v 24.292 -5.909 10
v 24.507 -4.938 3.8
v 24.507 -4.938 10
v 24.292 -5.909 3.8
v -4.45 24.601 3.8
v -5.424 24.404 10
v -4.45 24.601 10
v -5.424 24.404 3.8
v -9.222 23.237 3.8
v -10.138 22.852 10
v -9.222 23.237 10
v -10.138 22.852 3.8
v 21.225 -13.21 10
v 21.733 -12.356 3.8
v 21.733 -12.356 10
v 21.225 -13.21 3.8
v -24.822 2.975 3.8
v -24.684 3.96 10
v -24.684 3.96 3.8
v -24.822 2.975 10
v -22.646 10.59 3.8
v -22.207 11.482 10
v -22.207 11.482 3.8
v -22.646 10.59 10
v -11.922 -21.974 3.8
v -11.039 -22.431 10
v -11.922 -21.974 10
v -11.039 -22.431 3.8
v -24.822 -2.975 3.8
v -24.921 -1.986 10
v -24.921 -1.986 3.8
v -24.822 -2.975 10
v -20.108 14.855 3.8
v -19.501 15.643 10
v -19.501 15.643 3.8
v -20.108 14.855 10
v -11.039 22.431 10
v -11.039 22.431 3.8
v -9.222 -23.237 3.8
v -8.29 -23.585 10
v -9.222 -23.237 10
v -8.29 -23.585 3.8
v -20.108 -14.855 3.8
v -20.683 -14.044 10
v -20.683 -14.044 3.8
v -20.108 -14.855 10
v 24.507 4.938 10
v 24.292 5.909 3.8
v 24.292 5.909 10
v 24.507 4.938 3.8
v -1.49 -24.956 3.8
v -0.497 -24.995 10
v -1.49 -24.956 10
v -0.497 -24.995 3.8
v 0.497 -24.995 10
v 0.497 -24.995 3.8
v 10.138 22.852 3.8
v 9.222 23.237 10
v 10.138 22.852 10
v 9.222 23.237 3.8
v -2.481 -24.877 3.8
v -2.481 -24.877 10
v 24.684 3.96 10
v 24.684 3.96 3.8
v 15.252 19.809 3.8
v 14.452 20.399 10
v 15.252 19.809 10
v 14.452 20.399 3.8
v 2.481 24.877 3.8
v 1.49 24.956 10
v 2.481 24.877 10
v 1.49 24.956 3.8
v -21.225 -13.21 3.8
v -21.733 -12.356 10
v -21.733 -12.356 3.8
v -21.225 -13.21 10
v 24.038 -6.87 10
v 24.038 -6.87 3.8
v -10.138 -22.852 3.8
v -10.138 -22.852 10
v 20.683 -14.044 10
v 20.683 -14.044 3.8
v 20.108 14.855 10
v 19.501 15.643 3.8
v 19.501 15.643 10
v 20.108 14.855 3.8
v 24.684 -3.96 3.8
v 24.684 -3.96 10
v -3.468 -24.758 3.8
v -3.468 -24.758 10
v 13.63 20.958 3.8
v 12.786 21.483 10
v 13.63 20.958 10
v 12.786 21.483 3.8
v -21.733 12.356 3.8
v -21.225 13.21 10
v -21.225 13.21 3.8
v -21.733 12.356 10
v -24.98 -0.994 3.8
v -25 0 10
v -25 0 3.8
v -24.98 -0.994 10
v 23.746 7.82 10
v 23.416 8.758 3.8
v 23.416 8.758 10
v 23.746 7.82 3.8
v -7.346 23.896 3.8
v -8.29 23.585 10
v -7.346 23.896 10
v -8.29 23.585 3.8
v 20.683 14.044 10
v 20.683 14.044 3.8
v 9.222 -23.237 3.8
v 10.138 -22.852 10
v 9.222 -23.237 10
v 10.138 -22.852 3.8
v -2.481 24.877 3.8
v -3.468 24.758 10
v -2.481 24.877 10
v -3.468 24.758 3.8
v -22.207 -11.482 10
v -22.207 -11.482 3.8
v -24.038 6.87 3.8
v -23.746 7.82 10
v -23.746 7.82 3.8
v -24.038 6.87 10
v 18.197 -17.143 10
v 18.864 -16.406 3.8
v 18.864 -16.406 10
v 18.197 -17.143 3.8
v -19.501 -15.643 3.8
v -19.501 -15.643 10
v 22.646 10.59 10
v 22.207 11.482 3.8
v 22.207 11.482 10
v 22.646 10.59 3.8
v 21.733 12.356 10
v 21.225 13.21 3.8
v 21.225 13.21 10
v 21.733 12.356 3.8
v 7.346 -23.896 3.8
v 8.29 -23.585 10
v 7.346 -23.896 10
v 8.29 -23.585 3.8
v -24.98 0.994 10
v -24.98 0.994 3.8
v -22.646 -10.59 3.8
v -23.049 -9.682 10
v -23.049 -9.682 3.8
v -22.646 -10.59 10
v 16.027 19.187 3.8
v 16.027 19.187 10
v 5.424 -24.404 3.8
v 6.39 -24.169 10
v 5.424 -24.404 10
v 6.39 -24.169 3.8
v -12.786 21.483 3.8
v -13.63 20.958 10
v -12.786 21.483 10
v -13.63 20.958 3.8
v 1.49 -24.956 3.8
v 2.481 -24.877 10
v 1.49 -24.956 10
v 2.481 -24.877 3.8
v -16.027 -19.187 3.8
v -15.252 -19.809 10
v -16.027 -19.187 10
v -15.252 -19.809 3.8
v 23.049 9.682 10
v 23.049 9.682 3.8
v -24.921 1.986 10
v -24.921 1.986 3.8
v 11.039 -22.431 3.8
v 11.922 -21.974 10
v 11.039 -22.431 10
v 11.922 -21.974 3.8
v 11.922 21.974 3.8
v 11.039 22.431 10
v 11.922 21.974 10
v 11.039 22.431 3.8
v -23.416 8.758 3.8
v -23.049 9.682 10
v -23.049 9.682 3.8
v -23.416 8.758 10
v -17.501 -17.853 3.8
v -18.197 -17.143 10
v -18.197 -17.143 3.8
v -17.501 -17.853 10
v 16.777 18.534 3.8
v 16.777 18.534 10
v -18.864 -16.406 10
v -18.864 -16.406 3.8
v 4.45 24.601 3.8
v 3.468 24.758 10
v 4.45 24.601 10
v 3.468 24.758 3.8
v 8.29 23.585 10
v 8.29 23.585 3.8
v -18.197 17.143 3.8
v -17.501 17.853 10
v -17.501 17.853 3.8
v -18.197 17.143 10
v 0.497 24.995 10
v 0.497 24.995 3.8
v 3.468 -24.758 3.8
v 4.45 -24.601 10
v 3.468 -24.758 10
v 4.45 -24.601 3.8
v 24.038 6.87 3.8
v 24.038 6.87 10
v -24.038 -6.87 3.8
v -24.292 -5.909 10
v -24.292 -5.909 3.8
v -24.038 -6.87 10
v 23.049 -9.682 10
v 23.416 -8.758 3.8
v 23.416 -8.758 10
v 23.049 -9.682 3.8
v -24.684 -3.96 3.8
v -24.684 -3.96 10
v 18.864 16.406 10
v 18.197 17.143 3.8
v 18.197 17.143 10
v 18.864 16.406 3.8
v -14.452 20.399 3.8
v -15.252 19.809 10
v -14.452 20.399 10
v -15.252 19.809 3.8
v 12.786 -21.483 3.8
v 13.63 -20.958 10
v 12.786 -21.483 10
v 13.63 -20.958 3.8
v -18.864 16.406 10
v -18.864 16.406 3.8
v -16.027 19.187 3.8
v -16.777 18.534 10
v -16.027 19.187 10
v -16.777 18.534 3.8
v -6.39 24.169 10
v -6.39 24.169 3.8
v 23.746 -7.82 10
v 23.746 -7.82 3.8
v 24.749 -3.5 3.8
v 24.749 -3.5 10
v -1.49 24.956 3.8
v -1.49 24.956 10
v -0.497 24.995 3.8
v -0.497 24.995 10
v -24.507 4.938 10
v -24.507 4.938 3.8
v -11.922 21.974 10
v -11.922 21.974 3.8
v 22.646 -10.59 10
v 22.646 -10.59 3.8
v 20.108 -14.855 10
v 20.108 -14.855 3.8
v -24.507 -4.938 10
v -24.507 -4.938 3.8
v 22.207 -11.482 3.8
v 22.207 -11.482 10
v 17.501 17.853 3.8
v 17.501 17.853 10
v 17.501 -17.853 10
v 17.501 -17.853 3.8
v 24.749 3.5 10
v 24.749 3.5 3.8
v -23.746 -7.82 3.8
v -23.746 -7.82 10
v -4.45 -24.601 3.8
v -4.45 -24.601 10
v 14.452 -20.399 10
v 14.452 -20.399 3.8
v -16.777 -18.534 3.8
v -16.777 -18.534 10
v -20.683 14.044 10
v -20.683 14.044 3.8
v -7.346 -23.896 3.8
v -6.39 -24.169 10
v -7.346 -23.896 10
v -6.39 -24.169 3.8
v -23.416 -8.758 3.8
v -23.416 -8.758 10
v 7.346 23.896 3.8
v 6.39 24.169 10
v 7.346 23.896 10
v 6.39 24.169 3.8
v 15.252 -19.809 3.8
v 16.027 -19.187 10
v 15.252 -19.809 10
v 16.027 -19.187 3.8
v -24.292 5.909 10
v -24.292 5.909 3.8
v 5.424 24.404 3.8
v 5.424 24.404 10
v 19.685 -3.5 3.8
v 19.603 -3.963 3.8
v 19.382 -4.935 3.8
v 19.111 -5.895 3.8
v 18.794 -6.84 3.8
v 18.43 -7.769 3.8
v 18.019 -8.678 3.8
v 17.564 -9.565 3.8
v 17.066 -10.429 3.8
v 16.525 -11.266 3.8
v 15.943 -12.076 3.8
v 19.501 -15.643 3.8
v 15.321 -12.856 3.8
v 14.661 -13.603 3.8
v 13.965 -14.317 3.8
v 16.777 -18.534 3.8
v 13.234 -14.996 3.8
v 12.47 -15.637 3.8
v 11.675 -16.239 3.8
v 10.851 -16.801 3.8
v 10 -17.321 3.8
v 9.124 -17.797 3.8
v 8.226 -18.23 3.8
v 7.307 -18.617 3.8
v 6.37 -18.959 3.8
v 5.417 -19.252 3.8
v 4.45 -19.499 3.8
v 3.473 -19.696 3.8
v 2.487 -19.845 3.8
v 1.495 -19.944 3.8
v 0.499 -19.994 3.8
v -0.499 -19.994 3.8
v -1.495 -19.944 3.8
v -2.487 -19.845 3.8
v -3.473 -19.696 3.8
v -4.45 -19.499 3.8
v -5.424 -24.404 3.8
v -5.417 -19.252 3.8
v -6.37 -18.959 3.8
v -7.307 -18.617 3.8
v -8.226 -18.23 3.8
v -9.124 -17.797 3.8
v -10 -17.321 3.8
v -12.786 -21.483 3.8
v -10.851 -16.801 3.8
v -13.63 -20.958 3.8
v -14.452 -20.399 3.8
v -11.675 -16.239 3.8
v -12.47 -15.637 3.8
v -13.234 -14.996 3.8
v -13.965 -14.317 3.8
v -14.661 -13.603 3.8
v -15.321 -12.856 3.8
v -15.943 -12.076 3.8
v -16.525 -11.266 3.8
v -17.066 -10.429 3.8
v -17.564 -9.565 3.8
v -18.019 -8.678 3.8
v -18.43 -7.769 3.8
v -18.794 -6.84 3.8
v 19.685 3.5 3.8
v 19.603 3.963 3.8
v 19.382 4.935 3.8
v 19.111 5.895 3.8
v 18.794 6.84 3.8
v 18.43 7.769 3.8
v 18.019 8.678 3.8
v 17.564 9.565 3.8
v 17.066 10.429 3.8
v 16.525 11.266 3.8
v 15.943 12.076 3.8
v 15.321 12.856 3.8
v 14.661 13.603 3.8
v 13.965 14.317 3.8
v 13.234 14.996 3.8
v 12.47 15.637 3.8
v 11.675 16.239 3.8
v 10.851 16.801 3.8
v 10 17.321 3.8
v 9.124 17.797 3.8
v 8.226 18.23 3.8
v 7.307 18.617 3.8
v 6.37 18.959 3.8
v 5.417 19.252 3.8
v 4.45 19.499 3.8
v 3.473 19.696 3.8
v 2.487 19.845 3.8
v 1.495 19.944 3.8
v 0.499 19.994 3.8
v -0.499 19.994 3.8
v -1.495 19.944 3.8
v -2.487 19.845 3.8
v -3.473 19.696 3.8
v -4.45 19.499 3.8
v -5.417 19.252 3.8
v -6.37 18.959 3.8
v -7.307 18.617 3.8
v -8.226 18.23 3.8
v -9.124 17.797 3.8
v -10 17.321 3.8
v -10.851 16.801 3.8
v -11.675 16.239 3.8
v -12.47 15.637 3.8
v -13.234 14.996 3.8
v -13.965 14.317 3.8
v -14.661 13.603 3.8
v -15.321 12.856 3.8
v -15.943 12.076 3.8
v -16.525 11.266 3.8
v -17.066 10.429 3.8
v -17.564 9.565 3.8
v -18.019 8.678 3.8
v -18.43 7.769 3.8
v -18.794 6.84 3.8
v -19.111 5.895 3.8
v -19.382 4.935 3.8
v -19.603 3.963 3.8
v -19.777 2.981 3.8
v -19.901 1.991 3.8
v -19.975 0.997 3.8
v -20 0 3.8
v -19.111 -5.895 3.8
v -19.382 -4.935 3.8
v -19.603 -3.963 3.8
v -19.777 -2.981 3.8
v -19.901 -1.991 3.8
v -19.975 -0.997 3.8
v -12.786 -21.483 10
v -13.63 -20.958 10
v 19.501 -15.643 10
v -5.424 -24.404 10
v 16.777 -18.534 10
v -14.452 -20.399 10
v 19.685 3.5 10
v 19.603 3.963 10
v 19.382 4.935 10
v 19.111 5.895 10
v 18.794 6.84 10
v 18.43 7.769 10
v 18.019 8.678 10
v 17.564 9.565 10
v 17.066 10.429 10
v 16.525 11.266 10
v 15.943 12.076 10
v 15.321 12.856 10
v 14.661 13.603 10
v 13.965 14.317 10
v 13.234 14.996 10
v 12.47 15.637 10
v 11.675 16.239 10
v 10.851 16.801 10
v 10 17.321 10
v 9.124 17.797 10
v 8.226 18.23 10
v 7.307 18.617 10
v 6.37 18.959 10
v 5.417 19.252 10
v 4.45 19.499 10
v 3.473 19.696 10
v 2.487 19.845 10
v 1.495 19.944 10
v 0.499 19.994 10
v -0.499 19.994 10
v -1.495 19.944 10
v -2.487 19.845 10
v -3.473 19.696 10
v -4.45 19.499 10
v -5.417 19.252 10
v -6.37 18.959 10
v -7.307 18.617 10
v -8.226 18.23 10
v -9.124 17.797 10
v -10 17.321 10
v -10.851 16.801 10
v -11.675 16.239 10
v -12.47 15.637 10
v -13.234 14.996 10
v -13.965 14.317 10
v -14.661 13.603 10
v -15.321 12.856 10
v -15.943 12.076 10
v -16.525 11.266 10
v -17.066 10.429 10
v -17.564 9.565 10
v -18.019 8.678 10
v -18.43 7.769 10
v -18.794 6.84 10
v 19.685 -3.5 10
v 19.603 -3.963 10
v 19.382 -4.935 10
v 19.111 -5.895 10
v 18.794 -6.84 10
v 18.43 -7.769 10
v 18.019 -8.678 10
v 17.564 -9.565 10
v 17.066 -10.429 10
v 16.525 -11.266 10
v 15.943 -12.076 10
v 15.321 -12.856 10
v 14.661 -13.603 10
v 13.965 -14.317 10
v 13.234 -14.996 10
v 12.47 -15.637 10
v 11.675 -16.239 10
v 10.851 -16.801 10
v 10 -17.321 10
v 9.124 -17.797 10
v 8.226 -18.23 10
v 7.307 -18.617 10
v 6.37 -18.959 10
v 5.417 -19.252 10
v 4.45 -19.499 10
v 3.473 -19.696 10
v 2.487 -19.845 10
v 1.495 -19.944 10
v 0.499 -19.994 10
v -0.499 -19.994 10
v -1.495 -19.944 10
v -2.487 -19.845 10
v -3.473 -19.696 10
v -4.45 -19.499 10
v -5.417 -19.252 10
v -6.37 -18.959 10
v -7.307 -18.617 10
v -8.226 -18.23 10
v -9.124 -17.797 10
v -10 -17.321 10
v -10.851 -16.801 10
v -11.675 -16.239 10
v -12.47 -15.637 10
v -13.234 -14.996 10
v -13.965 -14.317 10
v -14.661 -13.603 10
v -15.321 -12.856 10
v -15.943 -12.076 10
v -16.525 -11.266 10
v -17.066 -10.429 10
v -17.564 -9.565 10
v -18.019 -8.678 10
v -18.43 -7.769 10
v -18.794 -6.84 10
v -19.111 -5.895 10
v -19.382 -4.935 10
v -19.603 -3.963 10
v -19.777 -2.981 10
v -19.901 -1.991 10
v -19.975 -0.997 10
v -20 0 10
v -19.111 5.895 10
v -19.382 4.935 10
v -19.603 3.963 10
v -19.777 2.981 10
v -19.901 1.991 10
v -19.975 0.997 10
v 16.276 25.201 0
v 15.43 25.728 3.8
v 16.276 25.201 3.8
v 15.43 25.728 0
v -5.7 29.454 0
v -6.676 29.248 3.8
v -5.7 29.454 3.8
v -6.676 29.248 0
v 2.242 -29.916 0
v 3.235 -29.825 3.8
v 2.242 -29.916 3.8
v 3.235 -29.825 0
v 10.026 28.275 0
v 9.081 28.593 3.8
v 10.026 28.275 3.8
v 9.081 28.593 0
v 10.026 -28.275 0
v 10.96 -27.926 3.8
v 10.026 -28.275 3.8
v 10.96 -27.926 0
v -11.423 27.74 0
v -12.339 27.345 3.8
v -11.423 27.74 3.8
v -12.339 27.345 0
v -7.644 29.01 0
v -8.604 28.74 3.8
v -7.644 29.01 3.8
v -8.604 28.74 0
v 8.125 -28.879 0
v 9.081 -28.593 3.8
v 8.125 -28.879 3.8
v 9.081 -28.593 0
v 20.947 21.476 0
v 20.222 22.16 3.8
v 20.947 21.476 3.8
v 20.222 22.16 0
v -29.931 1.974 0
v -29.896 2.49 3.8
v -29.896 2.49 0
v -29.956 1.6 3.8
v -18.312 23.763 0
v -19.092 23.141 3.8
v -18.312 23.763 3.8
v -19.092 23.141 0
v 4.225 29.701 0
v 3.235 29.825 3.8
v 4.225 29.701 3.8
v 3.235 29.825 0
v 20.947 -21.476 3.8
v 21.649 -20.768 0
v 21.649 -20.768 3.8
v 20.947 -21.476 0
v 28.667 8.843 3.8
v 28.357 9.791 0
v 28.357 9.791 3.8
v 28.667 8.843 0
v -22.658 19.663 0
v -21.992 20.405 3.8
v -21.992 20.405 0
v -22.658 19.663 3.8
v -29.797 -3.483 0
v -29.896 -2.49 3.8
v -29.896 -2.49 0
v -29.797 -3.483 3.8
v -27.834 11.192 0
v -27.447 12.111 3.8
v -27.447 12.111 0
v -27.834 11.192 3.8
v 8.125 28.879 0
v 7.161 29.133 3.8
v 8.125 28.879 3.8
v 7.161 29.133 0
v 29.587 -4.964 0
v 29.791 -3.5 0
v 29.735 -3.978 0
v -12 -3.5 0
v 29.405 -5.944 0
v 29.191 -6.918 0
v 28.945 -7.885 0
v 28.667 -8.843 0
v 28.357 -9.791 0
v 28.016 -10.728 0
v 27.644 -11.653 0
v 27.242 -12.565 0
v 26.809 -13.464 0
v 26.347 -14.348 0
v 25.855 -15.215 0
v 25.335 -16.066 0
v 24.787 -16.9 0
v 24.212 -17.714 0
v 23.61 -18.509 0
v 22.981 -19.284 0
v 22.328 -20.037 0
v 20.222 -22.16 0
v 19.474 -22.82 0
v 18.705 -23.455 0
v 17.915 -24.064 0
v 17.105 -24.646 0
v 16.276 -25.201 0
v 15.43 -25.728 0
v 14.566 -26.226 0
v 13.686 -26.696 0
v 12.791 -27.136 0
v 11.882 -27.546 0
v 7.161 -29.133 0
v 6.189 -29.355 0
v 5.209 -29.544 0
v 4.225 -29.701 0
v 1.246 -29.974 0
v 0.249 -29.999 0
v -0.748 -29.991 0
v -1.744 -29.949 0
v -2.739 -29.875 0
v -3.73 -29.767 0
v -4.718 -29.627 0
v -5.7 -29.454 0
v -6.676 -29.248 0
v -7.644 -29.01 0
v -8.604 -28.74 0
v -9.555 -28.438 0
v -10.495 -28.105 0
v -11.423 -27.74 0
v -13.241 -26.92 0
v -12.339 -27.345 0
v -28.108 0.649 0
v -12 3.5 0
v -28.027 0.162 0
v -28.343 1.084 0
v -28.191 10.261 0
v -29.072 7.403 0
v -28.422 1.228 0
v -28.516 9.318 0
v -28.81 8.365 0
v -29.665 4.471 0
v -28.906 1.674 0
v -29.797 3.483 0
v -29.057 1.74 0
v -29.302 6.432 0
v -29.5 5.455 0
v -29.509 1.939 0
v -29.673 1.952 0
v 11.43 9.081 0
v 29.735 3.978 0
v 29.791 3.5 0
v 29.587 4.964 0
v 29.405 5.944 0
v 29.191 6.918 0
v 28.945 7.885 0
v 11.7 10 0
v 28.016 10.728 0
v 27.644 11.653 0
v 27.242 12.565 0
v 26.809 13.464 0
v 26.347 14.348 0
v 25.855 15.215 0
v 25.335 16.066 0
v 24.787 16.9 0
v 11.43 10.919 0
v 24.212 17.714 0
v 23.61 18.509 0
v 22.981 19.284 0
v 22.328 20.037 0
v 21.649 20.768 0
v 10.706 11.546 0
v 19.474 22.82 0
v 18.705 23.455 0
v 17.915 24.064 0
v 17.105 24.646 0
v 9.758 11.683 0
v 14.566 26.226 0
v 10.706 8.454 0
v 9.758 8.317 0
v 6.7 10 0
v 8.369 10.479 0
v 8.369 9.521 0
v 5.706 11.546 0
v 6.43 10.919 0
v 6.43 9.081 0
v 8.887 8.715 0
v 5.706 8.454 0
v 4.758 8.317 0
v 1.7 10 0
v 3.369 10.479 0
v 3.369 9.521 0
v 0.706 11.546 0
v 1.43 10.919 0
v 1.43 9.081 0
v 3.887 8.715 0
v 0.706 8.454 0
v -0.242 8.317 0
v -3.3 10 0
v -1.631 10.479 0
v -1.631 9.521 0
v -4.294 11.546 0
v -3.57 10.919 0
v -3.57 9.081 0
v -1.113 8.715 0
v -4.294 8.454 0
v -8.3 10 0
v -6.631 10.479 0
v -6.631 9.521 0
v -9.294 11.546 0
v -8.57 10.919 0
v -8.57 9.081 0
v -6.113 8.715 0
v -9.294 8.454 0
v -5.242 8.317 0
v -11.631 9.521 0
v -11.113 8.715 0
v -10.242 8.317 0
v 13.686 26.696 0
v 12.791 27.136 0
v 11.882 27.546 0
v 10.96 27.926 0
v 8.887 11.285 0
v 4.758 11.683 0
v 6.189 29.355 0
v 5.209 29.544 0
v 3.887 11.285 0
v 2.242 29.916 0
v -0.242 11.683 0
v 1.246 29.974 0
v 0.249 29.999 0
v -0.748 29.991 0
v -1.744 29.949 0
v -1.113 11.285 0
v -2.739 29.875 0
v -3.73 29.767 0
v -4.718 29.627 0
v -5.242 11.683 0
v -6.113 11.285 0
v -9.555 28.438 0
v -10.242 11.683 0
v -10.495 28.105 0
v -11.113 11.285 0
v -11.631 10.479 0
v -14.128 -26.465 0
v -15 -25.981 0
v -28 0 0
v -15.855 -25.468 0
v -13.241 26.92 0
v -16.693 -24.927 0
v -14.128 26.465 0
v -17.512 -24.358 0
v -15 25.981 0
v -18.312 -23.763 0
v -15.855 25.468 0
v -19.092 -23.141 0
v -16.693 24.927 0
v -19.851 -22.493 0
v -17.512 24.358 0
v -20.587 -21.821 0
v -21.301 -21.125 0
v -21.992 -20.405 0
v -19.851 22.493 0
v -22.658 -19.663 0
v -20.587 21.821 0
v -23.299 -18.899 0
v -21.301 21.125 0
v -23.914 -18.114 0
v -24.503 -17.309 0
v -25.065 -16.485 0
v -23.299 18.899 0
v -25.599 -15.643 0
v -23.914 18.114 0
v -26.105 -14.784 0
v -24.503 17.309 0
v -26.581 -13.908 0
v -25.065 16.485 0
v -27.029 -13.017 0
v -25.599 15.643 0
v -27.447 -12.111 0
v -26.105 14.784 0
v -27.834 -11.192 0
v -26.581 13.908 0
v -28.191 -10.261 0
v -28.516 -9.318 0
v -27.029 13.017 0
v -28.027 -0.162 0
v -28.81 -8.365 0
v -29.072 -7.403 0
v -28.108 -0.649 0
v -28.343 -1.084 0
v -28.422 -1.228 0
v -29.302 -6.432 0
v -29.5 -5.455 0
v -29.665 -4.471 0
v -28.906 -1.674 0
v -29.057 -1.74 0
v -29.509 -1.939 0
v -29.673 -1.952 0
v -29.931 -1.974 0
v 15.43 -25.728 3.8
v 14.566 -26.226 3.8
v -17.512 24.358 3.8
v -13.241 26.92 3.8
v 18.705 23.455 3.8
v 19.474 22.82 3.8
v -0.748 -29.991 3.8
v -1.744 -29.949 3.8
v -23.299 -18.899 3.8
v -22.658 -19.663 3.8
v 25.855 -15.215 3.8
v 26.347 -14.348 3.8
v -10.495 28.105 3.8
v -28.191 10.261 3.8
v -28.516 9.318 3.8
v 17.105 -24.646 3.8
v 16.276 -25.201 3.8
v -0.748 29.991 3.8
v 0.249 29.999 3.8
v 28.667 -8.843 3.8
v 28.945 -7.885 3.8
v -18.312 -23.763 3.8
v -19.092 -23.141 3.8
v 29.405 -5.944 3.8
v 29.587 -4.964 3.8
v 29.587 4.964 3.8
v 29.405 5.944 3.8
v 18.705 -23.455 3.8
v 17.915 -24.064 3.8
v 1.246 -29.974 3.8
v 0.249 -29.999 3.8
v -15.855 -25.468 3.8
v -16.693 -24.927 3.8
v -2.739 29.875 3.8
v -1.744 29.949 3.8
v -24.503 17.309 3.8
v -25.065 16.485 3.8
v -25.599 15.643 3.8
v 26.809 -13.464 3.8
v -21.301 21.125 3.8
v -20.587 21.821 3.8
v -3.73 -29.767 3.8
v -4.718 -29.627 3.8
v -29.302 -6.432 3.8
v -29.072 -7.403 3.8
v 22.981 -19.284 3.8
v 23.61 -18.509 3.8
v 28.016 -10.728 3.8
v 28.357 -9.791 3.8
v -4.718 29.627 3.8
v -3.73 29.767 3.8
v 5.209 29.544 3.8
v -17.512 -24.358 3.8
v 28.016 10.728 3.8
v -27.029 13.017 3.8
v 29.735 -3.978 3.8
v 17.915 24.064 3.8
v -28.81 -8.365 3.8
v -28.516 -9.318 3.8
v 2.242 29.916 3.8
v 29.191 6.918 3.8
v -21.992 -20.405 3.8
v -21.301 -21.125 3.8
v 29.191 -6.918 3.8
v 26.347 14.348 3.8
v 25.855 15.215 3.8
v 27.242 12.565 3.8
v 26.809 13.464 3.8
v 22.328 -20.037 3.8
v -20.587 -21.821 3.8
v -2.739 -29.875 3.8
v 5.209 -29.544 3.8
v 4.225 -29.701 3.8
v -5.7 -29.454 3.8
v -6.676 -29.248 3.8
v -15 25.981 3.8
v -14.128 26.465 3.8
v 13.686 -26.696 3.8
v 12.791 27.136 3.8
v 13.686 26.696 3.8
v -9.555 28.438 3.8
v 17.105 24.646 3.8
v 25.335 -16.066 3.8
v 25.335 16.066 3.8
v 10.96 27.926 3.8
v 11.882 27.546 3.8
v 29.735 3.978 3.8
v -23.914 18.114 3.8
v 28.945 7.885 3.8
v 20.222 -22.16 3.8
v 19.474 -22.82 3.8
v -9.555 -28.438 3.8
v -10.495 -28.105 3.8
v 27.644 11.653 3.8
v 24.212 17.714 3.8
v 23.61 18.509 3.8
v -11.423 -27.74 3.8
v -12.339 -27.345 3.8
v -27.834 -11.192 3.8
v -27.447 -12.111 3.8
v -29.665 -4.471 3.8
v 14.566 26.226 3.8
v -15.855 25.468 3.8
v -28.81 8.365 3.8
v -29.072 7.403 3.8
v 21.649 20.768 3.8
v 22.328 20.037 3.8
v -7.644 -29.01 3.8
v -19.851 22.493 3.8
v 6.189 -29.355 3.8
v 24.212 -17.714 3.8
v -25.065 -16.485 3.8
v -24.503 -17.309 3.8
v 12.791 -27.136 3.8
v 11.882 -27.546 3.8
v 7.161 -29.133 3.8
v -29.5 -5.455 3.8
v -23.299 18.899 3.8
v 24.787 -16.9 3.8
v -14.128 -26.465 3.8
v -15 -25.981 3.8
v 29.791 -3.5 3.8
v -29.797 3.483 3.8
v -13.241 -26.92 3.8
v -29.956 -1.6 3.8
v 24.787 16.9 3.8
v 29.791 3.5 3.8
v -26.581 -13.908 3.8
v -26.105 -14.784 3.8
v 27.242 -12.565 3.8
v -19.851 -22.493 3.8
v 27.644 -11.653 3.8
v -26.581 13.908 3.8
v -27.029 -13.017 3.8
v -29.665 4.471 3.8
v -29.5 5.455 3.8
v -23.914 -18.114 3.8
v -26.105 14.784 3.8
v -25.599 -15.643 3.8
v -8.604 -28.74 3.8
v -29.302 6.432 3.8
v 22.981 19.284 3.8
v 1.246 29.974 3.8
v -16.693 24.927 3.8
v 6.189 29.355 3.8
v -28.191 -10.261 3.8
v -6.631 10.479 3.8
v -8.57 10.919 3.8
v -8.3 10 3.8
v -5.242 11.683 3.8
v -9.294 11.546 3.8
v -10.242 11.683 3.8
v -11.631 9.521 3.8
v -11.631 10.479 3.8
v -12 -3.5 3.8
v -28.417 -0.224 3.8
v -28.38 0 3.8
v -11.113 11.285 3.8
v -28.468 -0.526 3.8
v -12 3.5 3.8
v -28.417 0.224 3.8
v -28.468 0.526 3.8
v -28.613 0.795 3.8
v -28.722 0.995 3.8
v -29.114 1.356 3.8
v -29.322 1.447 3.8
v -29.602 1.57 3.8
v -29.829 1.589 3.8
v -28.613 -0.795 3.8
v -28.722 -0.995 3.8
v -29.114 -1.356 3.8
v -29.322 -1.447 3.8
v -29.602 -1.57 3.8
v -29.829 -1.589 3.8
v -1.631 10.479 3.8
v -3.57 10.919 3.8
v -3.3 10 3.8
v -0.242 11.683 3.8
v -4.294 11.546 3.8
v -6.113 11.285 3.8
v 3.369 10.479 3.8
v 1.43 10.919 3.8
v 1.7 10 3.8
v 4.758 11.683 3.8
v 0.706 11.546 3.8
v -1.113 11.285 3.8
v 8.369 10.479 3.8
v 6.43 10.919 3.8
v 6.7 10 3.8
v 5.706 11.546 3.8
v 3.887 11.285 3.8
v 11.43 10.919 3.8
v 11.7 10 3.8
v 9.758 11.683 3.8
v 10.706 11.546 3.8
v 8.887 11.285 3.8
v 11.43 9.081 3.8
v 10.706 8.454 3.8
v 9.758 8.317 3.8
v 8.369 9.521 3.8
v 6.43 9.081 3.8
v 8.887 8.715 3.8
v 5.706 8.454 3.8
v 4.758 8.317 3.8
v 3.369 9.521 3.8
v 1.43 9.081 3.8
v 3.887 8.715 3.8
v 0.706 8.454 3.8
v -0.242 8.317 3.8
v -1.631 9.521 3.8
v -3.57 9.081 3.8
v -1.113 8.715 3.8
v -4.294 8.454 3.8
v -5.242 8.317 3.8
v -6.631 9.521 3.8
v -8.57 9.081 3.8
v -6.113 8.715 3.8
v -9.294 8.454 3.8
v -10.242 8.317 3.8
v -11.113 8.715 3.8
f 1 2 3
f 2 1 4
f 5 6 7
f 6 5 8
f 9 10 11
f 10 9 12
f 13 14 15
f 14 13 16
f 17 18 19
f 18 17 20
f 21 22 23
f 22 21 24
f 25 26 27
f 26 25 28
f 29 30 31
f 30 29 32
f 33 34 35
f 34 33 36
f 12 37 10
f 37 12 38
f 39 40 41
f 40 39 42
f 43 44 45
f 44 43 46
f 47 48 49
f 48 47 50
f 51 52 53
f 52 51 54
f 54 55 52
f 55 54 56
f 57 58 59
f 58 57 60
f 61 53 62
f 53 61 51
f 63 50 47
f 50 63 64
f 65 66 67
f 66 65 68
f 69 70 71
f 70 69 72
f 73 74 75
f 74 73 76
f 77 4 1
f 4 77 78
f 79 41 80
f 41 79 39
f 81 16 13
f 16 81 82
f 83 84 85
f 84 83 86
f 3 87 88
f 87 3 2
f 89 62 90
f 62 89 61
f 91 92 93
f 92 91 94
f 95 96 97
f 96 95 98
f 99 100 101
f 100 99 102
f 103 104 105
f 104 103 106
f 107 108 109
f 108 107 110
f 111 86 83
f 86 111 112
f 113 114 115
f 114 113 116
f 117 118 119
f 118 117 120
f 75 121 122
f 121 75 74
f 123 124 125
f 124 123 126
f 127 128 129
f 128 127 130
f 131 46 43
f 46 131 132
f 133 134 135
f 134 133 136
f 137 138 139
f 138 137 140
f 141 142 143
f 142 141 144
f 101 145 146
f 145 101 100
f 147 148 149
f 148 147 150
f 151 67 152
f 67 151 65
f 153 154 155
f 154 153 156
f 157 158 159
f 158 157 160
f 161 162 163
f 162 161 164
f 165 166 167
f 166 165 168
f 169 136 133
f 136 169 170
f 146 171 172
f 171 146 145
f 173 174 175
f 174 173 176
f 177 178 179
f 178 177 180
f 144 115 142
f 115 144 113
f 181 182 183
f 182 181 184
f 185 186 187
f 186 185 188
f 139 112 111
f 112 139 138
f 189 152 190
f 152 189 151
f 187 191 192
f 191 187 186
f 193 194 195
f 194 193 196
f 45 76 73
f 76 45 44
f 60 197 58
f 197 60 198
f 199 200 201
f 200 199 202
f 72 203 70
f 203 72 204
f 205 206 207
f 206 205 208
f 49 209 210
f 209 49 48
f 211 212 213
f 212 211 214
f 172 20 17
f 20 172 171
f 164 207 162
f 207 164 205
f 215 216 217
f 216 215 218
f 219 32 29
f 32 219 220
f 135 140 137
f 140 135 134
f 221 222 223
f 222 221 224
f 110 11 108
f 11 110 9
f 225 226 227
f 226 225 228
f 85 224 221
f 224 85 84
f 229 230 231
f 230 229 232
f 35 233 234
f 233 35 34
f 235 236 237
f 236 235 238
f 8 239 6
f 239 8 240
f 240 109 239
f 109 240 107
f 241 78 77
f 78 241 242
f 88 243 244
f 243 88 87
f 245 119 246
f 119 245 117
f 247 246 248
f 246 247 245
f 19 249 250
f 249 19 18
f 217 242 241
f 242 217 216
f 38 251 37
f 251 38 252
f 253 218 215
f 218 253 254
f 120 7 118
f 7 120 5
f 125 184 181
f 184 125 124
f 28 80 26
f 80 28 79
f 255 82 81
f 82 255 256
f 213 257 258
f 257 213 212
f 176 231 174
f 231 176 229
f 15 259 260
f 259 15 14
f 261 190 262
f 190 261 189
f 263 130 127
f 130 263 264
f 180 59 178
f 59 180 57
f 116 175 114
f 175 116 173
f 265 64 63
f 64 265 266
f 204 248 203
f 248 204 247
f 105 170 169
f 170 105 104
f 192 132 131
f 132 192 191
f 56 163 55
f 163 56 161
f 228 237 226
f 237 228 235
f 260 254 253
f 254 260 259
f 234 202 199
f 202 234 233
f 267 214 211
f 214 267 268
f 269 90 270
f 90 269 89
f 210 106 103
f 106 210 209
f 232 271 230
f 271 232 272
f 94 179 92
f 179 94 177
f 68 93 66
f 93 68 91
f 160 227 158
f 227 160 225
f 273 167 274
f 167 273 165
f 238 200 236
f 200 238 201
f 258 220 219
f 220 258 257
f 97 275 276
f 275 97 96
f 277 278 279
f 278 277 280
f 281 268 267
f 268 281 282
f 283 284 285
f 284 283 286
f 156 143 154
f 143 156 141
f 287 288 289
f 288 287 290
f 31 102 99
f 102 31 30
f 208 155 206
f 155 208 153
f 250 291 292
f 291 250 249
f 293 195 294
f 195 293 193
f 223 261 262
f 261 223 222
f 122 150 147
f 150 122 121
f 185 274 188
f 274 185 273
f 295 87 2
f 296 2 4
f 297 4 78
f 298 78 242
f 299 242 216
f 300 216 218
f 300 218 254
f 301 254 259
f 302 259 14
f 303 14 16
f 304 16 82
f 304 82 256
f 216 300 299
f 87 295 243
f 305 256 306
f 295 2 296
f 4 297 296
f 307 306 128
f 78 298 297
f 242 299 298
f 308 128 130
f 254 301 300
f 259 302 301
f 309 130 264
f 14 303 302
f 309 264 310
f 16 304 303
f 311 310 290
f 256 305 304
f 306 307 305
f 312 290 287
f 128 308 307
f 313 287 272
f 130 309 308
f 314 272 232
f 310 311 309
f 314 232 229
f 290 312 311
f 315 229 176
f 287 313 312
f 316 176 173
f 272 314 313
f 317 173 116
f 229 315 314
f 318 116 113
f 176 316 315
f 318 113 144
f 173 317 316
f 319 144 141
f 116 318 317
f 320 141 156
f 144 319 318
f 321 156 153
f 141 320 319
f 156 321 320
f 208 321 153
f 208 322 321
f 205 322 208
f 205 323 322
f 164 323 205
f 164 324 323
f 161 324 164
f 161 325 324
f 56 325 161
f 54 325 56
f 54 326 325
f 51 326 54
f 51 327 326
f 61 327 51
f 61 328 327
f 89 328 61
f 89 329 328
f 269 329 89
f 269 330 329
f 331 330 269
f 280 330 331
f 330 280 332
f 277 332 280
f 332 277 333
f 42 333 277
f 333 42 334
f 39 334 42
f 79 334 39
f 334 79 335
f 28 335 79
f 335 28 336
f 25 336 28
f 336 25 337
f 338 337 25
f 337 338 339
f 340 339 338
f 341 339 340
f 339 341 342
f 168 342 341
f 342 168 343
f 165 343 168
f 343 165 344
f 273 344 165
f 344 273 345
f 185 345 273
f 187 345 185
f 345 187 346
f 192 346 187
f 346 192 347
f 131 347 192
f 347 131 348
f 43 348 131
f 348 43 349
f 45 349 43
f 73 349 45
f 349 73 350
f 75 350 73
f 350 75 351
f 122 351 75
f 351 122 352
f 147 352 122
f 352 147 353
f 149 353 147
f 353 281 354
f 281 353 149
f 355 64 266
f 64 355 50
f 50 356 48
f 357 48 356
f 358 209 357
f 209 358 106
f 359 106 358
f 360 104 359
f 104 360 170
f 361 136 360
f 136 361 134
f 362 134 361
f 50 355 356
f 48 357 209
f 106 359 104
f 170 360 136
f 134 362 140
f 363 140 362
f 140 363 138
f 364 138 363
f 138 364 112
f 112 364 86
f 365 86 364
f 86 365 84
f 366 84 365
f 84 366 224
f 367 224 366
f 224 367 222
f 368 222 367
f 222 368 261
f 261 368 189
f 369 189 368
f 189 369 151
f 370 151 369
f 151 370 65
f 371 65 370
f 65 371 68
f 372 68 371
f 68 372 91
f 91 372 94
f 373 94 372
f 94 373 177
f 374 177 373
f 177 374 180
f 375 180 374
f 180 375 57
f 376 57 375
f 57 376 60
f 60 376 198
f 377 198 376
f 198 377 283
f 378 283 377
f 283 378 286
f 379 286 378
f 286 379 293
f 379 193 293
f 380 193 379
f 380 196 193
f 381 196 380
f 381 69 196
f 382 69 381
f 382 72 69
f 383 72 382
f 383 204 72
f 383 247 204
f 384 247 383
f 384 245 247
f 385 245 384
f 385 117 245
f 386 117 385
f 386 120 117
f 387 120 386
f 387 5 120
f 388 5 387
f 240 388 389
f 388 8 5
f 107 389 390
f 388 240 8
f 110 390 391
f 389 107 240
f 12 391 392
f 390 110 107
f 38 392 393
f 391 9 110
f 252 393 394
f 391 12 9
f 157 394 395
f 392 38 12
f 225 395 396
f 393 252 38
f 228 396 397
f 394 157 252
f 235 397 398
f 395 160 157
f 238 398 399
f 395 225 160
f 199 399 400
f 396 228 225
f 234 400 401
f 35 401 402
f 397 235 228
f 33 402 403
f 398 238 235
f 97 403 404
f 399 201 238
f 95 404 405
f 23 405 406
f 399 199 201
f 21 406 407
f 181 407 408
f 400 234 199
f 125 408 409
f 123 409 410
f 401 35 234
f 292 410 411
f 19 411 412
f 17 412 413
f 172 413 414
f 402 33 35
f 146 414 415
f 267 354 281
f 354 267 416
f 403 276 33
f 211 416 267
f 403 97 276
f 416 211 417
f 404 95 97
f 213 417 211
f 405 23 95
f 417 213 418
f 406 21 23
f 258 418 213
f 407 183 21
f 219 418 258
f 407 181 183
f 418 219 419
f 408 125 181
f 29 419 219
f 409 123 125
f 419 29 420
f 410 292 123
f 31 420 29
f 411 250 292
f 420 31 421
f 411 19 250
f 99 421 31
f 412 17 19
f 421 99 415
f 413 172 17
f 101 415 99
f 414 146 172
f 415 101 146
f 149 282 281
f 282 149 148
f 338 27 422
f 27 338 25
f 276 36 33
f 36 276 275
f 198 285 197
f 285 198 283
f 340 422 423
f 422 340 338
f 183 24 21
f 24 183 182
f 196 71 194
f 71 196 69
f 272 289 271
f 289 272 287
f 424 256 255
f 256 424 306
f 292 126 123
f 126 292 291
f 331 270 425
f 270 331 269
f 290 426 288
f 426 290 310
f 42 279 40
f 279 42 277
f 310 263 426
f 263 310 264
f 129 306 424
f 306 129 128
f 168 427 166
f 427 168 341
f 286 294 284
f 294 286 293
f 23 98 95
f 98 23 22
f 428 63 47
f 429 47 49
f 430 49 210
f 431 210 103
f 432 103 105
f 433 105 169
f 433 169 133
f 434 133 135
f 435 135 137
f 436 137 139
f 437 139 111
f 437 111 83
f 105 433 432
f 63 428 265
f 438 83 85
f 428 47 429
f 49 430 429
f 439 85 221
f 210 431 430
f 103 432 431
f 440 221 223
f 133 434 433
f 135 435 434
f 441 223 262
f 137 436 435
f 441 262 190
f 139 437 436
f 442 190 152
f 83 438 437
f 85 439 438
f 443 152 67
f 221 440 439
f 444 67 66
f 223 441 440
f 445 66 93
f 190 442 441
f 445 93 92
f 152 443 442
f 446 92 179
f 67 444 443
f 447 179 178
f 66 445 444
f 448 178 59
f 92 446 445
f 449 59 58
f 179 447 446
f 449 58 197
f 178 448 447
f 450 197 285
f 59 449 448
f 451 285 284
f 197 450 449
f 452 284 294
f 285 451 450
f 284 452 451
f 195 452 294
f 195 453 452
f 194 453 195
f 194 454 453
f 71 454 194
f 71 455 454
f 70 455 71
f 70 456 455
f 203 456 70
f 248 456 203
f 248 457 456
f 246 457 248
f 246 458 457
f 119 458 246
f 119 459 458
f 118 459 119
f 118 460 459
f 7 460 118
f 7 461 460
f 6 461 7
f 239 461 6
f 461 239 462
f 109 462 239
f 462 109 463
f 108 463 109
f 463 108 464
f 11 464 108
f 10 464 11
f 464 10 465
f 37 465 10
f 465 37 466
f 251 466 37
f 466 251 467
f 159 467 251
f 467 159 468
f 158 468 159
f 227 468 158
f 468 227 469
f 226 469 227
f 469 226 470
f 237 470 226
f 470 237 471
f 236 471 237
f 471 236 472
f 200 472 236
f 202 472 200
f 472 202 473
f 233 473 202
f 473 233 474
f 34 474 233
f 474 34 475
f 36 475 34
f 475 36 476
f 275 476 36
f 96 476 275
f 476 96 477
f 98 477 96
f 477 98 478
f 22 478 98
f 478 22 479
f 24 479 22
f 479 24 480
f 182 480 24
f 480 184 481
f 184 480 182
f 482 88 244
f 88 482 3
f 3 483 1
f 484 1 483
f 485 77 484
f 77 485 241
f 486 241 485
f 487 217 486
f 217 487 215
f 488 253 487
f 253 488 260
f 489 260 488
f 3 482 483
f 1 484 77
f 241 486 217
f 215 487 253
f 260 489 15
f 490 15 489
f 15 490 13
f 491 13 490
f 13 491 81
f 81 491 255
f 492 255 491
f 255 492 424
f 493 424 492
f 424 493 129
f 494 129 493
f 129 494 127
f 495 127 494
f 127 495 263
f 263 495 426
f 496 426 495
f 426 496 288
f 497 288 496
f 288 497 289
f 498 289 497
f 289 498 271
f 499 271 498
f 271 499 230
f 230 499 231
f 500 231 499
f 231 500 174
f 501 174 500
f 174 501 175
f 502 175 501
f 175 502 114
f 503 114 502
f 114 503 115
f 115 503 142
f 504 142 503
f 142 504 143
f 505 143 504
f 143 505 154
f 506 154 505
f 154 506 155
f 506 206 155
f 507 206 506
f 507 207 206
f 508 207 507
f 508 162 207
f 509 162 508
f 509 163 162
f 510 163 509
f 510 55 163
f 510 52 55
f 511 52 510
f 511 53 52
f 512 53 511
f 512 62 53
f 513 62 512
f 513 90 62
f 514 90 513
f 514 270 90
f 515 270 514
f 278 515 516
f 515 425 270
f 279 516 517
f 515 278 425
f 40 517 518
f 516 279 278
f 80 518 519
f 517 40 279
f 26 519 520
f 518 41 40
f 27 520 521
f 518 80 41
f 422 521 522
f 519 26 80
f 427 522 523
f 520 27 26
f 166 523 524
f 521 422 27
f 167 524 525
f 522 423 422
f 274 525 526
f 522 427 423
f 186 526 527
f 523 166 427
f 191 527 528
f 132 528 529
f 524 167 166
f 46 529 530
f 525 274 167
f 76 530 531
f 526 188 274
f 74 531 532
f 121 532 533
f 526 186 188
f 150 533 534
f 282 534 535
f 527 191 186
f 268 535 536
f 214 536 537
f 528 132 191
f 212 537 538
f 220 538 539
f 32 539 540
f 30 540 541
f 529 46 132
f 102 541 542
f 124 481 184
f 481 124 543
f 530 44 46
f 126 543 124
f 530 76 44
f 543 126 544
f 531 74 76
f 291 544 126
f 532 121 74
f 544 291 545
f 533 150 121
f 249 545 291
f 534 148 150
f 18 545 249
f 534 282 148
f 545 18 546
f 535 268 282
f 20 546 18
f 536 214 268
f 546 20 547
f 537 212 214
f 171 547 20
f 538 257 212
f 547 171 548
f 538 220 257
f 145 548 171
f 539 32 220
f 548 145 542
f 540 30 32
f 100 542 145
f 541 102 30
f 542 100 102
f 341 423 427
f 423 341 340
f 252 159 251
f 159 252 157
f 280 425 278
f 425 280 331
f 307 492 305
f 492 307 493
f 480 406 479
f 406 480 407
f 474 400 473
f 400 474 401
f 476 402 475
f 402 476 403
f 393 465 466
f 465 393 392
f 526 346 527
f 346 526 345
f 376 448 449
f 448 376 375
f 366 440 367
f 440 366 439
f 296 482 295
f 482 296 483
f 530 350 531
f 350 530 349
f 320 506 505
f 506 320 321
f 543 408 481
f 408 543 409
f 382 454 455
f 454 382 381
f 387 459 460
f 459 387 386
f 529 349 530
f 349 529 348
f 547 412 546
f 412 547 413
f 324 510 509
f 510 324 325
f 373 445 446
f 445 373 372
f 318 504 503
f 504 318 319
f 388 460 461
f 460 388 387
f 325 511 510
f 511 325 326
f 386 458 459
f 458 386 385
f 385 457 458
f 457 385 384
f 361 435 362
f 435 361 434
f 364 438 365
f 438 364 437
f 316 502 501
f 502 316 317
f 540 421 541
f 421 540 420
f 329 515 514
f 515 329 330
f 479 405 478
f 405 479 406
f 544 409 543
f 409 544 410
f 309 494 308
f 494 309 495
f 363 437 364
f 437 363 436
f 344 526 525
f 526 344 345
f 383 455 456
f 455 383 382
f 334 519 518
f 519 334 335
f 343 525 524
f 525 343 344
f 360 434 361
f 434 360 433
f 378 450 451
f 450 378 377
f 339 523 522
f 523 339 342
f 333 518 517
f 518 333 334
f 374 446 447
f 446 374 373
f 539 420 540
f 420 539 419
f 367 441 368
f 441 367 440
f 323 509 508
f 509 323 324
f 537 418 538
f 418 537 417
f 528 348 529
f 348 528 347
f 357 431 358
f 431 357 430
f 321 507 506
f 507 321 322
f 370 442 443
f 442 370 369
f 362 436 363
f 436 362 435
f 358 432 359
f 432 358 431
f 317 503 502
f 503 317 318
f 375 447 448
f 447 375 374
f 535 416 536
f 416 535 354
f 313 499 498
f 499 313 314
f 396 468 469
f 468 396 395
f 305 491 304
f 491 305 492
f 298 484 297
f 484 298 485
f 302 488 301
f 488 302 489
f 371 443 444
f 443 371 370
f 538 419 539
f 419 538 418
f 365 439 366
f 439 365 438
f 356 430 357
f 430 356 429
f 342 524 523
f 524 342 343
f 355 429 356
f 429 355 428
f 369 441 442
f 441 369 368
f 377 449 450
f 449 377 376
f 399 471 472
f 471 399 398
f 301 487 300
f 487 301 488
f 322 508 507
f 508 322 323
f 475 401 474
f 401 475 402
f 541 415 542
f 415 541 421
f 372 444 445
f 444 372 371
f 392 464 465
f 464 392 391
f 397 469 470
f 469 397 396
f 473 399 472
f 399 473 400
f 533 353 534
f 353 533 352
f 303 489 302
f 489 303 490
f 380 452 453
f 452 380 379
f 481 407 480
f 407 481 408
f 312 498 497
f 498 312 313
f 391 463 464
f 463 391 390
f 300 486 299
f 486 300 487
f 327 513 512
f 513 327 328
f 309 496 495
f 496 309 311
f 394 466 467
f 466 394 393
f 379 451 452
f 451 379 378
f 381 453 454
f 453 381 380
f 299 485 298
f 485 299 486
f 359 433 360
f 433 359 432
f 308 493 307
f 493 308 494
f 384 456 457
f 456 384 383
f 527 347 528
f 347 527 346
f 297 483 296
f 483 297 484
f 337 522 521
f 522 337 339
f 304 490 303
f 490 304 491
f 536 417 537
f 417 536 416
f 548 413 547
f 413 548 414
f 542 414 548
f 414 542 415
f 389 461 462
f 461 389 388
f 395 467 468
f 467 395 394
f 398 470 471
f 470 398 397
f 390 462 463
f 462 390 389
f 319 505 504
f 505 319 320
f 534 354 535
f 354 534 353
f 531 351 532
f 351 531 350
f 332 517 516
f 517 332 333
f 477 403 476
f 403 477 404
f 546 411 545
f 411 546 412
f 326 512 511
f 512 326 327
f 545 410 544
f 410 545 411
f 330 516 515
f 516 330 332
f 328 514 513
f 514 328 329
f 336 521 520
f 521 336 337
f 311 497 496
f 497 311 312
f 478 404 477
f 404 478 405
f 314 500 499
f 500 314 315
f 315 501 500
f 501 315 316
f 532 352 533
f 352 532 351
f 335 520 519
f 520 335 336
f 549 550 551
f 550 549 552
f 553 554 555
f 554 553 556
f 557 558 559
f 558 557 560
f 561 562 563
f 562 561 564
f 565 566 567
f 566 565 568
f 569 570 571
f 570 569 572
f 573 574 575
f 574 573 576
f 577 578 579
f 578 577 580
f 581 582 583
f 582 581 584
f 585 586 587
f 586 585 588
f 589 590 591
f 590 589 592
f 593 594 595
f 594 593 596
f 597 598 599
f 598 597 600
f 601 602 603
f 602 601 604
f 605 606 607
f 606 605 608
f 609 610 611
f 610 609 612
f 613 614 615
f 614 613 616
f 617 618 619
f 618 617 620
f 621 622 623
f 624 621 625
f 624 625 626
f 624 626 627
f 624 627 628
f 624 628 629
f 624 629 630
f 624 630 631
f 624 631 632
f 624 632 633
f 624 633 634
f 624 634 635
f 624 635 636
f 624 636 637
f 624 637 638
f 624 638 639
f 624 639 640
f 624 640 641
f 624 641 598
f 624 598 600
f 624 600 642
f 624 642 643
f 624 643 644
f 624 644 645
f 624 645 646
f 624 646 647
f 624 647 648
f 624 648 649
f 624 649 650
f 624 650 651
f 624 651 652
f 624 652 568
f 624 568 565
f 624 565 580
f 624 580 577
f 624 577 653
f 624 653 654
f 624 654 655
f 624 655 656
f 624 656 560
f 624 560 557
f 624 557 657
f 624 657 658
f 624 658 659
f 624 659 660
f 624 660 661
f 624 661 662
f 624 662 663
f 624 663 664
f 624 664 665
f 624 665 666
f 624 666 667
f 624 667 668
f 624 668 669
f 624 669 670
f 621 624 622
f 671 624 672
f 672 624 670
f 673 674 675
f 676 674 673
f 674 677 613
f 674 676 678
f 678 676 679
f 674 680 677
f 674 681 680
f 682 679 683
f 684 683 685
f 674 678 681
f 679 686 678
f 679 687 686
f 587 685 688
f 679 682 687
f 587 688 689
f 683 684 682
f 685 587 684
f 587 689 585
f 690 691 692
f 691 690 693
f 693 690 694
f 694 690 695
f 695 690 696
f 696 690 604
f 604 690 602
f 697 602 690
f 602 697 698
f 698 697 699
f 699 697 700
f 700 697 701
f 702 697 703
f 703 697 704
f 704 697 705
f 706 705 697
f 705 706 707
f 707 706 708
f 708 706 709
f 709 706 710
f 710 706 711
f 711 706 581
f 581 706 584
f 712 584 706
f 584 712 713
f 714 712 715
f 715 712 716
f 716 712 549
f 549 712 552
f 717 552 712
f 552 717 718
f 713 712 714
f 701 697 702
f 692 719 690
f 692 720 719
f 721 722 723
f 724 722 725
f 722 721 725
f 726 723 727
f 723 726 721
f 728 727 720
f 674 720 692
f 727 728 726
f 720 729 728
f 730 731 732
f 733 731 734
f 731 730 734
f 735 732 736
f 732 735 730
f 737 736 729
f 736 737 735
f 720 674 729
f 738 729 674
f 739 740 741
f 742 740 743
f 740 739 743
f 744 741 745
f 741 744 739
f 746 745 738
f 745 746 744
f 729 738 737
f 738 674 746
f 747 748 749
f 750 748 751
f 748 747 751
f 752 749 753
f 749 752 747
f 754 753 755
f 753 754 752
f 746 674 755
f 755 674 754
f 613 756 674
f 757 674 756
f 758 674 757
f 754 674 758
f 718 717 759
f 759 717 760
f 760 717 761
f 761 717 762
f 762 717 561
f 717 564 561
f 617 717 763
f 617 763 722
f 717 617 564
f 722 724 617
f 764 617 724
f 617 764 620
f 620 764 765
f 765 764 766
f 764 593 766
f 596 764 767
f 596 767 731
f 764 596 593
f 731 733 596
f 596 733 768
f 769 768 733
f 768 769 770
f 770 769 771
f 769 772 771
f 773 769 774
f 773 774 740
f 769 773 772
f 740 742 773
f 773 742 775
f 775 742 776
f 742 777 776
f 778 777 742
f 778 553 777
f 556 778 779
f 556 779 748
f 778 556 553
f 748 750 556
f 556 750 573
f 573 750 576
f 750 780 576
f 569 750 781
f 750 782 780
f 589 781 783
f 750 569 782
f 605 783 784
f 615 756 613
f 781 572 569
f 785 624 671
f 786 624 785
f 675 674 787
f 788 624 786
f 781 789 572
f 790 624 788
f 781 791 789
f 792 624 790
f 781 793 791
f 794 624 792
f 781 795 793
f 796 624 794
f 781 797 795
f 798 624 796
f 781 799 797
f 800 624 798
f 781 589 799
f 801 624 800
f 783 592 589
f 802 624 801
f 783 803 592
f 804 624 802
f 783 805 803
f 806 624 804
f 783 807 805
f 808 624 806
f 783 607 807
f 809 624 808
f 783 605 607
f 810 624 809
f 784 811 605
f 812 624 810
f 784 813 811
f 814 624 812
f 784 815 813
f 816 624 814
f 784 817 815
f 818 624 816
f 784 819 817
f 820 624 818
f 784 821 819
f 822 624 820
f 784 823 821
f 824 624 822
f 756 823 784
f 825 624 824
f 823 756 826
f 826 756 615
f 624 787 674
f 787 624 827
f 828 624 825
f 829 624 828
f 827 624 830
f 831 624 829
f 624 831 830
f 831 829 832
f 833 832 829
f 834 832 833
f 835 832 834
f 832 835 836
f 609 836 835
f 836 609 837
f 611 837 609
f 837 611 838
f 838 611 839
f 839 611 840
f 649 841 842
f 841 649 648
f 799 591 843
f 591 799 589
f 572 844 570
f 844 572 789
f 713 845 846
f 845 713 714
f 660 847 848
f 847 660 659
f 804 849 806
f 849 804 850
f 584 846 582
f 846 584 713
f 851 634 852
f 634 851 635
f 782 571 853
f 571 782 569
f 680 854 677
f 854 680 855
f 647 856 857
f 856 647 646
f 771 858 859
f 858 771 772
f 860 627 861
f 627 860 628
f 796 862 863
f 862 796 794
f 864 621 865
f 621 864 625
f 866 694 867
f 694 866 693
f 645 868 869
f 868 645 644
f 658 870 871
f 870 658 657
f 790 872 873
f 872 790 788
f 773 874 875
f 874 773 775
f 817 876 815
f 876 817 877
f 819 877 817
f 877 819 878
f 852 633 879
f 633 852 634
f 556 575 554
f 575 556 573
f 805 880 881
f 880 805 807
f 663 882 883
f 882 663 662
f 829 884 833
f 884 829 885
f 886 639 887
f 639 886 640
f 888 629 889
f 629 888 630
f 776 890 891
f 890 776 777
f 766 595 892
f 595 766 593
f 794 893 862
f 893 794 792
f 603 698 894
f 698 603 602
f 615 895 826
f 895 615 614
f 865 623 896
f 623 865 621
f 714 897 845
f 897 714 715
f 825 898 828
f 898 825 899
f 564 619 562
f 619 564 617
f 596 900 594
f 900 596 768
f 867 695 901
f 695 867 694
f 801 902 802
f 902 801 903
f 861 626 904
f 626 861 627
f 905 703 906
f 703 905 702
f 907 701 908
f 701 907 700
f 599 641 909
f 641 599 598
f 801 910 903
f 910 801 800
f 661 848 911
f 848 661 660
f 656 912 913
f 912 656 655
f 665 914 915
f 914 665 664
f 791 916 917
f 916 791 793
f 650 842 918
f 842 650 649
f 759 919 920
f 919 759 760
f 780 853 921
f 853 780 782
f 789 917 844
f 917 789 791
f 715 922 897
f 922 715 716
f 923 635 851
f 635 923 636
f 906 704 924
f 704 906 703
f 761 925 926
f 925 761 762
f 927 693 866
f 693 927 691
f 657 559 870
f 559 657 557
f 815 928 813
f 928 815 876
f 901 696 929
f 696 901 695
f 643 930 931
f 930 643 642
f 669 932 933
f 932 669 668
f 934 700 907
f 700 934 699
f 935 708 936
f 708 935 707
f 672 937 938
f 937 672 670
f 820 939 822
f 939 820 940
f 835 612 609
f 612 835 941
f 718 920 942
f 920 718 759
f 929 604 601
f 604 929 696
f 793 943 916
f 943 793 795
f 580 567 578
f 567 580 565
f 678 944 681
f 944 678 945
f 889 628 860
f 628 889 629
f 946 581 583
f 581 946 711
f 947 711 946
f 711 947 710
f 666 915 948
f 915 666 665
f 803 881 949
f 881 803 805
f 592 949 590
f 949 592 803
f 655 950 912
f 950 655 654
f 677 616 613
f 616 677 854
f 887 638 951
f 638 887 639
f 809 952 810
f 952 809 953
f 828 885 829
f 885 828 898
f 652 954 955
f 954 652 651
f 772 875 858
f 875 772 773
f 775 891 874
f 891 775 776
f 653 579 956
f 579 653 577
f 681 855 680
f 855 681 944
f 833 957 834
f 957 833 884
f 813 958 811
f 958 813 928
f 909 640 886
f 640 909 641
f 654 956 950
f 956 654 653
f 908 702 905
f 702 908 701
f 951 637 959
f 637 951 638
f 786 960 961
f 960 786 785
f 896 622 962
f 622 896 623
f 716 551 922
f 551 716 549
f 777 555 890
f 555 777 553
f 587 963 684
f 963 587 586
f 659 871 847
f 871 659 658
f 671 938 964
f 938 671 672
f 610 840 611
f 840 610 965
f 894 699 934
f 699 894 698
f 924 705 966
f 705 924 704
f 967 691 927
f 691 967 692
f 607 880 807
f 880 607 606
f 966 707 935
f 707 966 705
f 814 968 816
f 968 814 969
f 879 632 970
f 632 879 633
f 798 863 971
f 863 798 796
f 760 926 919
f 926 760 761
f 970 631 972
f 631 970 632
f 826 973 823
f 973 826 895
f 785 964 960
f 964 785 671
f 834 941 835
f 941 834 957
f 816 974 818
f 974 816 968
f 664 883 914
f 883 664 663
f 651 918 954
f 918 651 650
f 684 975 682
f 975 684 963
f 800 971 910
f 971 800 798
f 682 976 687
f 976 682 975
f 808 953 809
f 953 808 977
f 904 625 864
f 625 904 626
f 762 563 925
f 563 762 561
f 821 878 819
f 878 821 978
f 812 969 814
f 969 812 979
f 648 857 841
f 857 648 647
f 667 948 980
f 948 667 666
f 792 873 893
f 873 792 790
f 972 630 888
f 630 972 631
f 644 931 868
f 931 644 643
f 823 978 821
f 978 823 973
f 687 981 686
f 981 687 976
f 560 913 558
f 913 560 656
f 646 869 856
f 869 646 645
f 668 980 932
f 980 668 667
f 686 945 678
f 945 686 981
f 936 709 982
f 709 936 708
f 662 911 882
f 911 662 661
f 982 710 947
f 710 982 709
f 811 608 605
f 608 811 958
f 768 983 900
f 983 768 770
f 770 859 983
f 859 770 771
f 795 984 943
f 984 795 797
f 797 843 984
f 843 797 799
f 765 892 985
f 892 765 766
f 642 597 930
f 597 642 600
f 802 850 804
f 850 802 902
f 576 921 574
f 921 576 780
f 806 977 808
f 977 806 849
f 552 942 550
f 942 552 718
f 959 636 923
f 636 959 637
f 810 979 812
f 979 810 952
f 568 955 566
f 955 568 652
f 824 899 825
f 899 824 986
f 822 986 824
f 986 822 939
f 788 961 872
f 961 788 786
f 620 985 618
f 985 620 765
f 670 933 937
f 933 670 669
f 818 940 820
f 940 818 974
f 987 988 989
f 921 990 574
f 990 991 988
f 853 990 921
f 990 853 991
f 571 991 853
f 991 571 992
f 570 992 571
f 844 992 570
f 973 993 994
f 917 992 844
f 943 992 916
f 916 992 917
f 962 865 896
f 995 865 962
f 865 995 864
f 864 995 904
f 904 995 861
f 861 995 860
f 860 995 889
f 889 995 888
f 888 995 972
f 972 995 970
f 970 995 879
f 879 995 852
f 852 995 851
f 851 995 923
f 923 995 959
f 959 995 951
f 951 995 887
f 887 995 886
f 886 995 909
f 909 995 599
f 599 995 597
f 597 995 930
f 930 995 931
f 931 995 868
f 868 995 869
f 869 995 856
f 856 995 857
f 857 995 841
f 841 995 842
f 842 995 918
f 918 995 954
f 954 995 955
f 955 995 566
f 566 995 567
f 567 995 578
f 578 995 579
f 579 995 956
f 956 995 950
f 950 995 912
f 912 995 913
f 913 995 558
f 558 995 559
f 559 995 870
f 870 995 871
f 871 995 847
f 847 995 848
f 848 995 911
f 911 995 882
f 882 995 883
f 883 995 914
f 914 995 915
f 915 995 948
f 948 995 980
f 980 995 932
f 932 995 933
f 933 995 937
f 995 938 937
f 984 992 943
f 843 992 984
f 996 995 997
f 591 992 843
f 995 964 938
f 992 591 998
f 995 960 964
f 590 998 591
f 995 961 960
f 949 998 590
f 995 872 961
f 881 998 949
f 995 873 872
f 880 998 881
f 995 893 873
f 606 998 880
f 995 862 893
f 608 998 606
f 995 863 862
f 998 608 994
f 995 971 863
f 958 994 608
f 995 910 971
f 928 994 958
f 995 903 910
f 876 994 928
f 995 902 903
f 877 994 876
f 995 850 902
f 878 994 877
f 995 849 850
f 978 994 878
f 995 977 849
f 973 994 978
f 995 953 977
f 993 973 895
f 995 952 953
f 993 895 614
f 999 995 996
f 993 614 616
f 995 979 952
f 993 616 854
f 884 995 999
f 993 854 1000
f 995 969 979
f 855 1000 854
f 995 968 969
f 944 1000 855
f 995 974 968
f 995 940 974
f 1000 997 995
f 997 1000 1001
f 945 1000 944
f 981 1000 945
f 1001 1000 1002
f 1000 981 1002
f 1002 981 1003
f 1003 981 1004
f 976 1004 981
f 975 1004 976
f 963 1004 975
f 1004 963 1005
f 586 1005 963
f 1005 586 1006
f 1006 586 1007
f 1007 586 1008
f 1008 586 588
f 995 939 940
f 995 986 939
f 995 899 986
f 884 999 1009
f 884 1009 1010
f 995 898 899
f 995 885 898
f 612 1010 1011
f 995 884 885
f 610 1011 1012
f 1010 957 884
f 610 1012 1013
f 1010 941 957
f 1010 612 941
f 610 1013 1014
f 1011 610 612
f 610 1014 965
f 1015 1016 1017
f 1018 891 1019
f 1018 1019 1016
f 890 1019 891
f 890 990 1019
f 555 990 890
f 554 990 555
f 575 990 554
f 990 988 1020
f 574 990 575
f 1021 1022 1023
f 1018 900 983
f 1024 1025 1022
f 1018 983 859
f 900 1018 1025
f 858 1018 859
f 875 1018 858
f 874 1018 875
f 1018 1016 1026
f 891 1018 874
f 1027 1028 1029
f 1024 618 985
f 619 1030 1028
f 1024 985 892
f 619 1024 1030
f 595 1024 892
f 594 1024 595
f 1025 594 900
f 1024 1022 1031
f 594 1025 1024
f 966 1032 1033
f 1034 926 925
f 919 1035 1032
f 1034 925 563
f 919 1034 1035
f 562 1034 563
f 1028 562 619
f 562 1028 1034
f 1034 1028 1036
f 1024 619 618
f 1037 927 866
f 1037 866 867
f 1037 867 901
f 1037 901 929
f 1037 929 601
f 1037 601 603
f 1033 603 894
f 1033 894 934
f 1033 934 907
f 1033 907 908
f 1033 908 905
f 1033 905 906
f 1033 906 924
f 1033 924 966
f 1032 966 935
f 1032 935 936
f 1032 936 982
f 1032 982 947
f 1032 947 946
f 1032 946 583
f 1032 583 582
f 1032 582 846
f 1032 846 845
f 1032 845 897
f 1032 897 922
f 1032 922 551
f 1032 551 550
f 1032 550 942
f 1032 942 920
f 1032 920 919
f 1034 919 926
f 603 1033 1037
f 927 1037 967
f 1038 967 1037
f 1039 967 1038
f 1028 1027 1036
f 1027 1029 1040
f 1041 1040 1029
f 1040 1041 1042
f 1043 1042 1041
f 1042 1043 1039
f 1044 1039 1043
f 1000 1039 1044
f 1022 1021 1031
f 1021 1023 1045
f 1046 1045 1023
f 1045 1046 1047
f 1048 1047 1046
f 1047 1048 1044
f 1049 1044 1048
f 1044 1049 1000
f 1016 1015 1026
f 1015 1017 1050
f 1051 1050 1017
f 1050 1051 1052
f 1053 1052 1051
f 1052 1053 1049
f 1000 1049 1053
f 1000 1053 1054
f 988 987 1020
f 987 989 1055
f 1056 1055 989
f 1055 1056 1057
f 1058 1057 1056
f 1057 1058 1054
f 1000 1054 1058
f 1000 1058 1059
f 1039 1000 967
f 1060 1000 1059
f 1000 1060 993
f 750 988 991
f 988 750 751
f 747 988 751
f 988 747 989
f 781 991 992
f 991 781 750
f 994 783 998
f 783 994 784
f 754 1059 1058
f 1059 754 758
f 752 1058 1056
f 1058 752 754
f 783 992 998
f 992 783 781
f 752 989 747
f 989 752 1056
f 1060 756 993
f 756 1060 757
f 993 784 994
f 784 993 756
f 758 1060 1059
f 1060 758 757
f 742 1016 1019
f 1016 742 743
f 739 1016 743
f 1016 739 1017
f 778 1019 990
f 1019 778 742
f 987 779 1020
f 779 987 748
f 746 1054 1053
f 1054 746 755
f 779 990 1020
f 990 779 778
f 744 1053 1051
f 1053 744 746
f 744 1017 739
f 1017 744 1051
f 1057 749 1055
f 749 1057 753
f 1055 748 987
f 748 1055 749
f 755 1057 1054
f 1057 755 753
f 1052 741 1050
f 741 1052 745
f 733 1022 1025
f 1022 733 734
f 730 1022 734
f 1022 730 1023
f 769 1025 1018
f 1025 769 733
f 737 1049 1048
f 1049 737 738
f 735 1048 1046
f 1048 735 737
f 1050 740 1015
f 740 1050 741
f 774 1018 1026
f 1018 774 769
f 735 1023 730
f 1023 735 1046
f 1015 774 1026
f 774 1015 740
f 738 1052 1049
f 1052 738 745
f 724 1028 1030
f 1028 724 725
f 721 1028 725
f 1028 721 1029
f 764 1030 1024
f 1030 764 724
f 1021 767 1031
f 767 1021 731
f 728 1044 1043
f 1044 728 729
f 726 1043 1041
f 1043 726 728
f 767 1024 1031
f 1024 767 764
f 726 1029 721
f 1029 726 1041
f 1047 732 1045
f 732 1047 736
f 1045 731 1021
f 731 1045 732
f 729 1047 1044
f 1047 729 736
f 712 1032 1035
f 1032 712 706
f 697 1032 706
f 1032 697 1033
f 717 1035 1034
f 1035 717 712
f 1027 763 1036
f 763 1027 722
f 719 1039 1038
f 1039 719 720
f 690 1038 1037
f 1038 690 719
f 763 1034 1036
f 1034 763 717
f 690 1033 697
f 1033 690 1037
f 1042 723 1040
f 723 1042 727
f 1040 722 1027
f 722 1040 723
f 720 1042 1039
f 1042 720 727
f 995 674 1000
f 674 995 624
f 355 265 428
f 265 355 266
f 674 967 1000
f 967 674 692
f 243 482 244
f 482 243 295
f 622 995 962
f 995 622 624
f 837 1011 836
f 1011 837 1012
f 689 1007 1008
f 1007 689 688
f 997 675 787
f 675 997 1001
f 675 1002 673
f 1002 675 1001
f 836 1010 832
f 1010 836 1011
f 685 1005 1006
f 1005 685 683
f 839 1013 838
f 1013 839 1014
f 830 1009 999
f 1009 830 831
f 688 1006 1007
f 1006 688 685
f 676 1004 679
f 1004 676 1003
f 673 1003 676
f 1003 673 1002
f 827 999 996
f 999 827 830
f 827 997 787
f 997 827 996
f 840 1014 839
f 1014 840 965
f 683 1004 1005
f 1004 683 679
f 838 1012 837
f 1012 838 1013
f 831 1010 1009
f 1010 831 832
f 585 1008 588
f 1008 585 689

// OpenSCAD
//make nice  circles
$fa = 1;
$fs = 1;
locater_r=3;
height = 10;
vent_r=1.7;
base_height = 3.8;
radius=30;

//make the whole thing
module bladeguide()
{
	difference()
	{
		base();
		slot();
		locate();
		vents();
	}	
}

module vents()
{
	for( y = [ - 10 : 5 : 10 ] )
	{
	translate([y,10,0])
		cylinder(h=height*2,r=vent_r,center=true);
	}
}

module slot()
{
	slot_center_offset=12; 
	slot_l=slot_center_offset+radius+5; //bit more to be safe
	m = slot_l/2-slot_center_offset;
	translate([m,0,0])
		cube(size=[slot_l,7,25],center=true);


}

module locate()
{
	translate([-radius,0,0])
		cylinder(height*2,locater_r,center=true);
}

module base()
{
	cylinder(h=base_height, r=radius );
	translate([0,0,base_height])
	difference() 
	{
		cylinder(height-3.8,50/2,50/2);
		cylinder(height*2,40/2,40/2,center=true);		
	}
}

bladeguide();
